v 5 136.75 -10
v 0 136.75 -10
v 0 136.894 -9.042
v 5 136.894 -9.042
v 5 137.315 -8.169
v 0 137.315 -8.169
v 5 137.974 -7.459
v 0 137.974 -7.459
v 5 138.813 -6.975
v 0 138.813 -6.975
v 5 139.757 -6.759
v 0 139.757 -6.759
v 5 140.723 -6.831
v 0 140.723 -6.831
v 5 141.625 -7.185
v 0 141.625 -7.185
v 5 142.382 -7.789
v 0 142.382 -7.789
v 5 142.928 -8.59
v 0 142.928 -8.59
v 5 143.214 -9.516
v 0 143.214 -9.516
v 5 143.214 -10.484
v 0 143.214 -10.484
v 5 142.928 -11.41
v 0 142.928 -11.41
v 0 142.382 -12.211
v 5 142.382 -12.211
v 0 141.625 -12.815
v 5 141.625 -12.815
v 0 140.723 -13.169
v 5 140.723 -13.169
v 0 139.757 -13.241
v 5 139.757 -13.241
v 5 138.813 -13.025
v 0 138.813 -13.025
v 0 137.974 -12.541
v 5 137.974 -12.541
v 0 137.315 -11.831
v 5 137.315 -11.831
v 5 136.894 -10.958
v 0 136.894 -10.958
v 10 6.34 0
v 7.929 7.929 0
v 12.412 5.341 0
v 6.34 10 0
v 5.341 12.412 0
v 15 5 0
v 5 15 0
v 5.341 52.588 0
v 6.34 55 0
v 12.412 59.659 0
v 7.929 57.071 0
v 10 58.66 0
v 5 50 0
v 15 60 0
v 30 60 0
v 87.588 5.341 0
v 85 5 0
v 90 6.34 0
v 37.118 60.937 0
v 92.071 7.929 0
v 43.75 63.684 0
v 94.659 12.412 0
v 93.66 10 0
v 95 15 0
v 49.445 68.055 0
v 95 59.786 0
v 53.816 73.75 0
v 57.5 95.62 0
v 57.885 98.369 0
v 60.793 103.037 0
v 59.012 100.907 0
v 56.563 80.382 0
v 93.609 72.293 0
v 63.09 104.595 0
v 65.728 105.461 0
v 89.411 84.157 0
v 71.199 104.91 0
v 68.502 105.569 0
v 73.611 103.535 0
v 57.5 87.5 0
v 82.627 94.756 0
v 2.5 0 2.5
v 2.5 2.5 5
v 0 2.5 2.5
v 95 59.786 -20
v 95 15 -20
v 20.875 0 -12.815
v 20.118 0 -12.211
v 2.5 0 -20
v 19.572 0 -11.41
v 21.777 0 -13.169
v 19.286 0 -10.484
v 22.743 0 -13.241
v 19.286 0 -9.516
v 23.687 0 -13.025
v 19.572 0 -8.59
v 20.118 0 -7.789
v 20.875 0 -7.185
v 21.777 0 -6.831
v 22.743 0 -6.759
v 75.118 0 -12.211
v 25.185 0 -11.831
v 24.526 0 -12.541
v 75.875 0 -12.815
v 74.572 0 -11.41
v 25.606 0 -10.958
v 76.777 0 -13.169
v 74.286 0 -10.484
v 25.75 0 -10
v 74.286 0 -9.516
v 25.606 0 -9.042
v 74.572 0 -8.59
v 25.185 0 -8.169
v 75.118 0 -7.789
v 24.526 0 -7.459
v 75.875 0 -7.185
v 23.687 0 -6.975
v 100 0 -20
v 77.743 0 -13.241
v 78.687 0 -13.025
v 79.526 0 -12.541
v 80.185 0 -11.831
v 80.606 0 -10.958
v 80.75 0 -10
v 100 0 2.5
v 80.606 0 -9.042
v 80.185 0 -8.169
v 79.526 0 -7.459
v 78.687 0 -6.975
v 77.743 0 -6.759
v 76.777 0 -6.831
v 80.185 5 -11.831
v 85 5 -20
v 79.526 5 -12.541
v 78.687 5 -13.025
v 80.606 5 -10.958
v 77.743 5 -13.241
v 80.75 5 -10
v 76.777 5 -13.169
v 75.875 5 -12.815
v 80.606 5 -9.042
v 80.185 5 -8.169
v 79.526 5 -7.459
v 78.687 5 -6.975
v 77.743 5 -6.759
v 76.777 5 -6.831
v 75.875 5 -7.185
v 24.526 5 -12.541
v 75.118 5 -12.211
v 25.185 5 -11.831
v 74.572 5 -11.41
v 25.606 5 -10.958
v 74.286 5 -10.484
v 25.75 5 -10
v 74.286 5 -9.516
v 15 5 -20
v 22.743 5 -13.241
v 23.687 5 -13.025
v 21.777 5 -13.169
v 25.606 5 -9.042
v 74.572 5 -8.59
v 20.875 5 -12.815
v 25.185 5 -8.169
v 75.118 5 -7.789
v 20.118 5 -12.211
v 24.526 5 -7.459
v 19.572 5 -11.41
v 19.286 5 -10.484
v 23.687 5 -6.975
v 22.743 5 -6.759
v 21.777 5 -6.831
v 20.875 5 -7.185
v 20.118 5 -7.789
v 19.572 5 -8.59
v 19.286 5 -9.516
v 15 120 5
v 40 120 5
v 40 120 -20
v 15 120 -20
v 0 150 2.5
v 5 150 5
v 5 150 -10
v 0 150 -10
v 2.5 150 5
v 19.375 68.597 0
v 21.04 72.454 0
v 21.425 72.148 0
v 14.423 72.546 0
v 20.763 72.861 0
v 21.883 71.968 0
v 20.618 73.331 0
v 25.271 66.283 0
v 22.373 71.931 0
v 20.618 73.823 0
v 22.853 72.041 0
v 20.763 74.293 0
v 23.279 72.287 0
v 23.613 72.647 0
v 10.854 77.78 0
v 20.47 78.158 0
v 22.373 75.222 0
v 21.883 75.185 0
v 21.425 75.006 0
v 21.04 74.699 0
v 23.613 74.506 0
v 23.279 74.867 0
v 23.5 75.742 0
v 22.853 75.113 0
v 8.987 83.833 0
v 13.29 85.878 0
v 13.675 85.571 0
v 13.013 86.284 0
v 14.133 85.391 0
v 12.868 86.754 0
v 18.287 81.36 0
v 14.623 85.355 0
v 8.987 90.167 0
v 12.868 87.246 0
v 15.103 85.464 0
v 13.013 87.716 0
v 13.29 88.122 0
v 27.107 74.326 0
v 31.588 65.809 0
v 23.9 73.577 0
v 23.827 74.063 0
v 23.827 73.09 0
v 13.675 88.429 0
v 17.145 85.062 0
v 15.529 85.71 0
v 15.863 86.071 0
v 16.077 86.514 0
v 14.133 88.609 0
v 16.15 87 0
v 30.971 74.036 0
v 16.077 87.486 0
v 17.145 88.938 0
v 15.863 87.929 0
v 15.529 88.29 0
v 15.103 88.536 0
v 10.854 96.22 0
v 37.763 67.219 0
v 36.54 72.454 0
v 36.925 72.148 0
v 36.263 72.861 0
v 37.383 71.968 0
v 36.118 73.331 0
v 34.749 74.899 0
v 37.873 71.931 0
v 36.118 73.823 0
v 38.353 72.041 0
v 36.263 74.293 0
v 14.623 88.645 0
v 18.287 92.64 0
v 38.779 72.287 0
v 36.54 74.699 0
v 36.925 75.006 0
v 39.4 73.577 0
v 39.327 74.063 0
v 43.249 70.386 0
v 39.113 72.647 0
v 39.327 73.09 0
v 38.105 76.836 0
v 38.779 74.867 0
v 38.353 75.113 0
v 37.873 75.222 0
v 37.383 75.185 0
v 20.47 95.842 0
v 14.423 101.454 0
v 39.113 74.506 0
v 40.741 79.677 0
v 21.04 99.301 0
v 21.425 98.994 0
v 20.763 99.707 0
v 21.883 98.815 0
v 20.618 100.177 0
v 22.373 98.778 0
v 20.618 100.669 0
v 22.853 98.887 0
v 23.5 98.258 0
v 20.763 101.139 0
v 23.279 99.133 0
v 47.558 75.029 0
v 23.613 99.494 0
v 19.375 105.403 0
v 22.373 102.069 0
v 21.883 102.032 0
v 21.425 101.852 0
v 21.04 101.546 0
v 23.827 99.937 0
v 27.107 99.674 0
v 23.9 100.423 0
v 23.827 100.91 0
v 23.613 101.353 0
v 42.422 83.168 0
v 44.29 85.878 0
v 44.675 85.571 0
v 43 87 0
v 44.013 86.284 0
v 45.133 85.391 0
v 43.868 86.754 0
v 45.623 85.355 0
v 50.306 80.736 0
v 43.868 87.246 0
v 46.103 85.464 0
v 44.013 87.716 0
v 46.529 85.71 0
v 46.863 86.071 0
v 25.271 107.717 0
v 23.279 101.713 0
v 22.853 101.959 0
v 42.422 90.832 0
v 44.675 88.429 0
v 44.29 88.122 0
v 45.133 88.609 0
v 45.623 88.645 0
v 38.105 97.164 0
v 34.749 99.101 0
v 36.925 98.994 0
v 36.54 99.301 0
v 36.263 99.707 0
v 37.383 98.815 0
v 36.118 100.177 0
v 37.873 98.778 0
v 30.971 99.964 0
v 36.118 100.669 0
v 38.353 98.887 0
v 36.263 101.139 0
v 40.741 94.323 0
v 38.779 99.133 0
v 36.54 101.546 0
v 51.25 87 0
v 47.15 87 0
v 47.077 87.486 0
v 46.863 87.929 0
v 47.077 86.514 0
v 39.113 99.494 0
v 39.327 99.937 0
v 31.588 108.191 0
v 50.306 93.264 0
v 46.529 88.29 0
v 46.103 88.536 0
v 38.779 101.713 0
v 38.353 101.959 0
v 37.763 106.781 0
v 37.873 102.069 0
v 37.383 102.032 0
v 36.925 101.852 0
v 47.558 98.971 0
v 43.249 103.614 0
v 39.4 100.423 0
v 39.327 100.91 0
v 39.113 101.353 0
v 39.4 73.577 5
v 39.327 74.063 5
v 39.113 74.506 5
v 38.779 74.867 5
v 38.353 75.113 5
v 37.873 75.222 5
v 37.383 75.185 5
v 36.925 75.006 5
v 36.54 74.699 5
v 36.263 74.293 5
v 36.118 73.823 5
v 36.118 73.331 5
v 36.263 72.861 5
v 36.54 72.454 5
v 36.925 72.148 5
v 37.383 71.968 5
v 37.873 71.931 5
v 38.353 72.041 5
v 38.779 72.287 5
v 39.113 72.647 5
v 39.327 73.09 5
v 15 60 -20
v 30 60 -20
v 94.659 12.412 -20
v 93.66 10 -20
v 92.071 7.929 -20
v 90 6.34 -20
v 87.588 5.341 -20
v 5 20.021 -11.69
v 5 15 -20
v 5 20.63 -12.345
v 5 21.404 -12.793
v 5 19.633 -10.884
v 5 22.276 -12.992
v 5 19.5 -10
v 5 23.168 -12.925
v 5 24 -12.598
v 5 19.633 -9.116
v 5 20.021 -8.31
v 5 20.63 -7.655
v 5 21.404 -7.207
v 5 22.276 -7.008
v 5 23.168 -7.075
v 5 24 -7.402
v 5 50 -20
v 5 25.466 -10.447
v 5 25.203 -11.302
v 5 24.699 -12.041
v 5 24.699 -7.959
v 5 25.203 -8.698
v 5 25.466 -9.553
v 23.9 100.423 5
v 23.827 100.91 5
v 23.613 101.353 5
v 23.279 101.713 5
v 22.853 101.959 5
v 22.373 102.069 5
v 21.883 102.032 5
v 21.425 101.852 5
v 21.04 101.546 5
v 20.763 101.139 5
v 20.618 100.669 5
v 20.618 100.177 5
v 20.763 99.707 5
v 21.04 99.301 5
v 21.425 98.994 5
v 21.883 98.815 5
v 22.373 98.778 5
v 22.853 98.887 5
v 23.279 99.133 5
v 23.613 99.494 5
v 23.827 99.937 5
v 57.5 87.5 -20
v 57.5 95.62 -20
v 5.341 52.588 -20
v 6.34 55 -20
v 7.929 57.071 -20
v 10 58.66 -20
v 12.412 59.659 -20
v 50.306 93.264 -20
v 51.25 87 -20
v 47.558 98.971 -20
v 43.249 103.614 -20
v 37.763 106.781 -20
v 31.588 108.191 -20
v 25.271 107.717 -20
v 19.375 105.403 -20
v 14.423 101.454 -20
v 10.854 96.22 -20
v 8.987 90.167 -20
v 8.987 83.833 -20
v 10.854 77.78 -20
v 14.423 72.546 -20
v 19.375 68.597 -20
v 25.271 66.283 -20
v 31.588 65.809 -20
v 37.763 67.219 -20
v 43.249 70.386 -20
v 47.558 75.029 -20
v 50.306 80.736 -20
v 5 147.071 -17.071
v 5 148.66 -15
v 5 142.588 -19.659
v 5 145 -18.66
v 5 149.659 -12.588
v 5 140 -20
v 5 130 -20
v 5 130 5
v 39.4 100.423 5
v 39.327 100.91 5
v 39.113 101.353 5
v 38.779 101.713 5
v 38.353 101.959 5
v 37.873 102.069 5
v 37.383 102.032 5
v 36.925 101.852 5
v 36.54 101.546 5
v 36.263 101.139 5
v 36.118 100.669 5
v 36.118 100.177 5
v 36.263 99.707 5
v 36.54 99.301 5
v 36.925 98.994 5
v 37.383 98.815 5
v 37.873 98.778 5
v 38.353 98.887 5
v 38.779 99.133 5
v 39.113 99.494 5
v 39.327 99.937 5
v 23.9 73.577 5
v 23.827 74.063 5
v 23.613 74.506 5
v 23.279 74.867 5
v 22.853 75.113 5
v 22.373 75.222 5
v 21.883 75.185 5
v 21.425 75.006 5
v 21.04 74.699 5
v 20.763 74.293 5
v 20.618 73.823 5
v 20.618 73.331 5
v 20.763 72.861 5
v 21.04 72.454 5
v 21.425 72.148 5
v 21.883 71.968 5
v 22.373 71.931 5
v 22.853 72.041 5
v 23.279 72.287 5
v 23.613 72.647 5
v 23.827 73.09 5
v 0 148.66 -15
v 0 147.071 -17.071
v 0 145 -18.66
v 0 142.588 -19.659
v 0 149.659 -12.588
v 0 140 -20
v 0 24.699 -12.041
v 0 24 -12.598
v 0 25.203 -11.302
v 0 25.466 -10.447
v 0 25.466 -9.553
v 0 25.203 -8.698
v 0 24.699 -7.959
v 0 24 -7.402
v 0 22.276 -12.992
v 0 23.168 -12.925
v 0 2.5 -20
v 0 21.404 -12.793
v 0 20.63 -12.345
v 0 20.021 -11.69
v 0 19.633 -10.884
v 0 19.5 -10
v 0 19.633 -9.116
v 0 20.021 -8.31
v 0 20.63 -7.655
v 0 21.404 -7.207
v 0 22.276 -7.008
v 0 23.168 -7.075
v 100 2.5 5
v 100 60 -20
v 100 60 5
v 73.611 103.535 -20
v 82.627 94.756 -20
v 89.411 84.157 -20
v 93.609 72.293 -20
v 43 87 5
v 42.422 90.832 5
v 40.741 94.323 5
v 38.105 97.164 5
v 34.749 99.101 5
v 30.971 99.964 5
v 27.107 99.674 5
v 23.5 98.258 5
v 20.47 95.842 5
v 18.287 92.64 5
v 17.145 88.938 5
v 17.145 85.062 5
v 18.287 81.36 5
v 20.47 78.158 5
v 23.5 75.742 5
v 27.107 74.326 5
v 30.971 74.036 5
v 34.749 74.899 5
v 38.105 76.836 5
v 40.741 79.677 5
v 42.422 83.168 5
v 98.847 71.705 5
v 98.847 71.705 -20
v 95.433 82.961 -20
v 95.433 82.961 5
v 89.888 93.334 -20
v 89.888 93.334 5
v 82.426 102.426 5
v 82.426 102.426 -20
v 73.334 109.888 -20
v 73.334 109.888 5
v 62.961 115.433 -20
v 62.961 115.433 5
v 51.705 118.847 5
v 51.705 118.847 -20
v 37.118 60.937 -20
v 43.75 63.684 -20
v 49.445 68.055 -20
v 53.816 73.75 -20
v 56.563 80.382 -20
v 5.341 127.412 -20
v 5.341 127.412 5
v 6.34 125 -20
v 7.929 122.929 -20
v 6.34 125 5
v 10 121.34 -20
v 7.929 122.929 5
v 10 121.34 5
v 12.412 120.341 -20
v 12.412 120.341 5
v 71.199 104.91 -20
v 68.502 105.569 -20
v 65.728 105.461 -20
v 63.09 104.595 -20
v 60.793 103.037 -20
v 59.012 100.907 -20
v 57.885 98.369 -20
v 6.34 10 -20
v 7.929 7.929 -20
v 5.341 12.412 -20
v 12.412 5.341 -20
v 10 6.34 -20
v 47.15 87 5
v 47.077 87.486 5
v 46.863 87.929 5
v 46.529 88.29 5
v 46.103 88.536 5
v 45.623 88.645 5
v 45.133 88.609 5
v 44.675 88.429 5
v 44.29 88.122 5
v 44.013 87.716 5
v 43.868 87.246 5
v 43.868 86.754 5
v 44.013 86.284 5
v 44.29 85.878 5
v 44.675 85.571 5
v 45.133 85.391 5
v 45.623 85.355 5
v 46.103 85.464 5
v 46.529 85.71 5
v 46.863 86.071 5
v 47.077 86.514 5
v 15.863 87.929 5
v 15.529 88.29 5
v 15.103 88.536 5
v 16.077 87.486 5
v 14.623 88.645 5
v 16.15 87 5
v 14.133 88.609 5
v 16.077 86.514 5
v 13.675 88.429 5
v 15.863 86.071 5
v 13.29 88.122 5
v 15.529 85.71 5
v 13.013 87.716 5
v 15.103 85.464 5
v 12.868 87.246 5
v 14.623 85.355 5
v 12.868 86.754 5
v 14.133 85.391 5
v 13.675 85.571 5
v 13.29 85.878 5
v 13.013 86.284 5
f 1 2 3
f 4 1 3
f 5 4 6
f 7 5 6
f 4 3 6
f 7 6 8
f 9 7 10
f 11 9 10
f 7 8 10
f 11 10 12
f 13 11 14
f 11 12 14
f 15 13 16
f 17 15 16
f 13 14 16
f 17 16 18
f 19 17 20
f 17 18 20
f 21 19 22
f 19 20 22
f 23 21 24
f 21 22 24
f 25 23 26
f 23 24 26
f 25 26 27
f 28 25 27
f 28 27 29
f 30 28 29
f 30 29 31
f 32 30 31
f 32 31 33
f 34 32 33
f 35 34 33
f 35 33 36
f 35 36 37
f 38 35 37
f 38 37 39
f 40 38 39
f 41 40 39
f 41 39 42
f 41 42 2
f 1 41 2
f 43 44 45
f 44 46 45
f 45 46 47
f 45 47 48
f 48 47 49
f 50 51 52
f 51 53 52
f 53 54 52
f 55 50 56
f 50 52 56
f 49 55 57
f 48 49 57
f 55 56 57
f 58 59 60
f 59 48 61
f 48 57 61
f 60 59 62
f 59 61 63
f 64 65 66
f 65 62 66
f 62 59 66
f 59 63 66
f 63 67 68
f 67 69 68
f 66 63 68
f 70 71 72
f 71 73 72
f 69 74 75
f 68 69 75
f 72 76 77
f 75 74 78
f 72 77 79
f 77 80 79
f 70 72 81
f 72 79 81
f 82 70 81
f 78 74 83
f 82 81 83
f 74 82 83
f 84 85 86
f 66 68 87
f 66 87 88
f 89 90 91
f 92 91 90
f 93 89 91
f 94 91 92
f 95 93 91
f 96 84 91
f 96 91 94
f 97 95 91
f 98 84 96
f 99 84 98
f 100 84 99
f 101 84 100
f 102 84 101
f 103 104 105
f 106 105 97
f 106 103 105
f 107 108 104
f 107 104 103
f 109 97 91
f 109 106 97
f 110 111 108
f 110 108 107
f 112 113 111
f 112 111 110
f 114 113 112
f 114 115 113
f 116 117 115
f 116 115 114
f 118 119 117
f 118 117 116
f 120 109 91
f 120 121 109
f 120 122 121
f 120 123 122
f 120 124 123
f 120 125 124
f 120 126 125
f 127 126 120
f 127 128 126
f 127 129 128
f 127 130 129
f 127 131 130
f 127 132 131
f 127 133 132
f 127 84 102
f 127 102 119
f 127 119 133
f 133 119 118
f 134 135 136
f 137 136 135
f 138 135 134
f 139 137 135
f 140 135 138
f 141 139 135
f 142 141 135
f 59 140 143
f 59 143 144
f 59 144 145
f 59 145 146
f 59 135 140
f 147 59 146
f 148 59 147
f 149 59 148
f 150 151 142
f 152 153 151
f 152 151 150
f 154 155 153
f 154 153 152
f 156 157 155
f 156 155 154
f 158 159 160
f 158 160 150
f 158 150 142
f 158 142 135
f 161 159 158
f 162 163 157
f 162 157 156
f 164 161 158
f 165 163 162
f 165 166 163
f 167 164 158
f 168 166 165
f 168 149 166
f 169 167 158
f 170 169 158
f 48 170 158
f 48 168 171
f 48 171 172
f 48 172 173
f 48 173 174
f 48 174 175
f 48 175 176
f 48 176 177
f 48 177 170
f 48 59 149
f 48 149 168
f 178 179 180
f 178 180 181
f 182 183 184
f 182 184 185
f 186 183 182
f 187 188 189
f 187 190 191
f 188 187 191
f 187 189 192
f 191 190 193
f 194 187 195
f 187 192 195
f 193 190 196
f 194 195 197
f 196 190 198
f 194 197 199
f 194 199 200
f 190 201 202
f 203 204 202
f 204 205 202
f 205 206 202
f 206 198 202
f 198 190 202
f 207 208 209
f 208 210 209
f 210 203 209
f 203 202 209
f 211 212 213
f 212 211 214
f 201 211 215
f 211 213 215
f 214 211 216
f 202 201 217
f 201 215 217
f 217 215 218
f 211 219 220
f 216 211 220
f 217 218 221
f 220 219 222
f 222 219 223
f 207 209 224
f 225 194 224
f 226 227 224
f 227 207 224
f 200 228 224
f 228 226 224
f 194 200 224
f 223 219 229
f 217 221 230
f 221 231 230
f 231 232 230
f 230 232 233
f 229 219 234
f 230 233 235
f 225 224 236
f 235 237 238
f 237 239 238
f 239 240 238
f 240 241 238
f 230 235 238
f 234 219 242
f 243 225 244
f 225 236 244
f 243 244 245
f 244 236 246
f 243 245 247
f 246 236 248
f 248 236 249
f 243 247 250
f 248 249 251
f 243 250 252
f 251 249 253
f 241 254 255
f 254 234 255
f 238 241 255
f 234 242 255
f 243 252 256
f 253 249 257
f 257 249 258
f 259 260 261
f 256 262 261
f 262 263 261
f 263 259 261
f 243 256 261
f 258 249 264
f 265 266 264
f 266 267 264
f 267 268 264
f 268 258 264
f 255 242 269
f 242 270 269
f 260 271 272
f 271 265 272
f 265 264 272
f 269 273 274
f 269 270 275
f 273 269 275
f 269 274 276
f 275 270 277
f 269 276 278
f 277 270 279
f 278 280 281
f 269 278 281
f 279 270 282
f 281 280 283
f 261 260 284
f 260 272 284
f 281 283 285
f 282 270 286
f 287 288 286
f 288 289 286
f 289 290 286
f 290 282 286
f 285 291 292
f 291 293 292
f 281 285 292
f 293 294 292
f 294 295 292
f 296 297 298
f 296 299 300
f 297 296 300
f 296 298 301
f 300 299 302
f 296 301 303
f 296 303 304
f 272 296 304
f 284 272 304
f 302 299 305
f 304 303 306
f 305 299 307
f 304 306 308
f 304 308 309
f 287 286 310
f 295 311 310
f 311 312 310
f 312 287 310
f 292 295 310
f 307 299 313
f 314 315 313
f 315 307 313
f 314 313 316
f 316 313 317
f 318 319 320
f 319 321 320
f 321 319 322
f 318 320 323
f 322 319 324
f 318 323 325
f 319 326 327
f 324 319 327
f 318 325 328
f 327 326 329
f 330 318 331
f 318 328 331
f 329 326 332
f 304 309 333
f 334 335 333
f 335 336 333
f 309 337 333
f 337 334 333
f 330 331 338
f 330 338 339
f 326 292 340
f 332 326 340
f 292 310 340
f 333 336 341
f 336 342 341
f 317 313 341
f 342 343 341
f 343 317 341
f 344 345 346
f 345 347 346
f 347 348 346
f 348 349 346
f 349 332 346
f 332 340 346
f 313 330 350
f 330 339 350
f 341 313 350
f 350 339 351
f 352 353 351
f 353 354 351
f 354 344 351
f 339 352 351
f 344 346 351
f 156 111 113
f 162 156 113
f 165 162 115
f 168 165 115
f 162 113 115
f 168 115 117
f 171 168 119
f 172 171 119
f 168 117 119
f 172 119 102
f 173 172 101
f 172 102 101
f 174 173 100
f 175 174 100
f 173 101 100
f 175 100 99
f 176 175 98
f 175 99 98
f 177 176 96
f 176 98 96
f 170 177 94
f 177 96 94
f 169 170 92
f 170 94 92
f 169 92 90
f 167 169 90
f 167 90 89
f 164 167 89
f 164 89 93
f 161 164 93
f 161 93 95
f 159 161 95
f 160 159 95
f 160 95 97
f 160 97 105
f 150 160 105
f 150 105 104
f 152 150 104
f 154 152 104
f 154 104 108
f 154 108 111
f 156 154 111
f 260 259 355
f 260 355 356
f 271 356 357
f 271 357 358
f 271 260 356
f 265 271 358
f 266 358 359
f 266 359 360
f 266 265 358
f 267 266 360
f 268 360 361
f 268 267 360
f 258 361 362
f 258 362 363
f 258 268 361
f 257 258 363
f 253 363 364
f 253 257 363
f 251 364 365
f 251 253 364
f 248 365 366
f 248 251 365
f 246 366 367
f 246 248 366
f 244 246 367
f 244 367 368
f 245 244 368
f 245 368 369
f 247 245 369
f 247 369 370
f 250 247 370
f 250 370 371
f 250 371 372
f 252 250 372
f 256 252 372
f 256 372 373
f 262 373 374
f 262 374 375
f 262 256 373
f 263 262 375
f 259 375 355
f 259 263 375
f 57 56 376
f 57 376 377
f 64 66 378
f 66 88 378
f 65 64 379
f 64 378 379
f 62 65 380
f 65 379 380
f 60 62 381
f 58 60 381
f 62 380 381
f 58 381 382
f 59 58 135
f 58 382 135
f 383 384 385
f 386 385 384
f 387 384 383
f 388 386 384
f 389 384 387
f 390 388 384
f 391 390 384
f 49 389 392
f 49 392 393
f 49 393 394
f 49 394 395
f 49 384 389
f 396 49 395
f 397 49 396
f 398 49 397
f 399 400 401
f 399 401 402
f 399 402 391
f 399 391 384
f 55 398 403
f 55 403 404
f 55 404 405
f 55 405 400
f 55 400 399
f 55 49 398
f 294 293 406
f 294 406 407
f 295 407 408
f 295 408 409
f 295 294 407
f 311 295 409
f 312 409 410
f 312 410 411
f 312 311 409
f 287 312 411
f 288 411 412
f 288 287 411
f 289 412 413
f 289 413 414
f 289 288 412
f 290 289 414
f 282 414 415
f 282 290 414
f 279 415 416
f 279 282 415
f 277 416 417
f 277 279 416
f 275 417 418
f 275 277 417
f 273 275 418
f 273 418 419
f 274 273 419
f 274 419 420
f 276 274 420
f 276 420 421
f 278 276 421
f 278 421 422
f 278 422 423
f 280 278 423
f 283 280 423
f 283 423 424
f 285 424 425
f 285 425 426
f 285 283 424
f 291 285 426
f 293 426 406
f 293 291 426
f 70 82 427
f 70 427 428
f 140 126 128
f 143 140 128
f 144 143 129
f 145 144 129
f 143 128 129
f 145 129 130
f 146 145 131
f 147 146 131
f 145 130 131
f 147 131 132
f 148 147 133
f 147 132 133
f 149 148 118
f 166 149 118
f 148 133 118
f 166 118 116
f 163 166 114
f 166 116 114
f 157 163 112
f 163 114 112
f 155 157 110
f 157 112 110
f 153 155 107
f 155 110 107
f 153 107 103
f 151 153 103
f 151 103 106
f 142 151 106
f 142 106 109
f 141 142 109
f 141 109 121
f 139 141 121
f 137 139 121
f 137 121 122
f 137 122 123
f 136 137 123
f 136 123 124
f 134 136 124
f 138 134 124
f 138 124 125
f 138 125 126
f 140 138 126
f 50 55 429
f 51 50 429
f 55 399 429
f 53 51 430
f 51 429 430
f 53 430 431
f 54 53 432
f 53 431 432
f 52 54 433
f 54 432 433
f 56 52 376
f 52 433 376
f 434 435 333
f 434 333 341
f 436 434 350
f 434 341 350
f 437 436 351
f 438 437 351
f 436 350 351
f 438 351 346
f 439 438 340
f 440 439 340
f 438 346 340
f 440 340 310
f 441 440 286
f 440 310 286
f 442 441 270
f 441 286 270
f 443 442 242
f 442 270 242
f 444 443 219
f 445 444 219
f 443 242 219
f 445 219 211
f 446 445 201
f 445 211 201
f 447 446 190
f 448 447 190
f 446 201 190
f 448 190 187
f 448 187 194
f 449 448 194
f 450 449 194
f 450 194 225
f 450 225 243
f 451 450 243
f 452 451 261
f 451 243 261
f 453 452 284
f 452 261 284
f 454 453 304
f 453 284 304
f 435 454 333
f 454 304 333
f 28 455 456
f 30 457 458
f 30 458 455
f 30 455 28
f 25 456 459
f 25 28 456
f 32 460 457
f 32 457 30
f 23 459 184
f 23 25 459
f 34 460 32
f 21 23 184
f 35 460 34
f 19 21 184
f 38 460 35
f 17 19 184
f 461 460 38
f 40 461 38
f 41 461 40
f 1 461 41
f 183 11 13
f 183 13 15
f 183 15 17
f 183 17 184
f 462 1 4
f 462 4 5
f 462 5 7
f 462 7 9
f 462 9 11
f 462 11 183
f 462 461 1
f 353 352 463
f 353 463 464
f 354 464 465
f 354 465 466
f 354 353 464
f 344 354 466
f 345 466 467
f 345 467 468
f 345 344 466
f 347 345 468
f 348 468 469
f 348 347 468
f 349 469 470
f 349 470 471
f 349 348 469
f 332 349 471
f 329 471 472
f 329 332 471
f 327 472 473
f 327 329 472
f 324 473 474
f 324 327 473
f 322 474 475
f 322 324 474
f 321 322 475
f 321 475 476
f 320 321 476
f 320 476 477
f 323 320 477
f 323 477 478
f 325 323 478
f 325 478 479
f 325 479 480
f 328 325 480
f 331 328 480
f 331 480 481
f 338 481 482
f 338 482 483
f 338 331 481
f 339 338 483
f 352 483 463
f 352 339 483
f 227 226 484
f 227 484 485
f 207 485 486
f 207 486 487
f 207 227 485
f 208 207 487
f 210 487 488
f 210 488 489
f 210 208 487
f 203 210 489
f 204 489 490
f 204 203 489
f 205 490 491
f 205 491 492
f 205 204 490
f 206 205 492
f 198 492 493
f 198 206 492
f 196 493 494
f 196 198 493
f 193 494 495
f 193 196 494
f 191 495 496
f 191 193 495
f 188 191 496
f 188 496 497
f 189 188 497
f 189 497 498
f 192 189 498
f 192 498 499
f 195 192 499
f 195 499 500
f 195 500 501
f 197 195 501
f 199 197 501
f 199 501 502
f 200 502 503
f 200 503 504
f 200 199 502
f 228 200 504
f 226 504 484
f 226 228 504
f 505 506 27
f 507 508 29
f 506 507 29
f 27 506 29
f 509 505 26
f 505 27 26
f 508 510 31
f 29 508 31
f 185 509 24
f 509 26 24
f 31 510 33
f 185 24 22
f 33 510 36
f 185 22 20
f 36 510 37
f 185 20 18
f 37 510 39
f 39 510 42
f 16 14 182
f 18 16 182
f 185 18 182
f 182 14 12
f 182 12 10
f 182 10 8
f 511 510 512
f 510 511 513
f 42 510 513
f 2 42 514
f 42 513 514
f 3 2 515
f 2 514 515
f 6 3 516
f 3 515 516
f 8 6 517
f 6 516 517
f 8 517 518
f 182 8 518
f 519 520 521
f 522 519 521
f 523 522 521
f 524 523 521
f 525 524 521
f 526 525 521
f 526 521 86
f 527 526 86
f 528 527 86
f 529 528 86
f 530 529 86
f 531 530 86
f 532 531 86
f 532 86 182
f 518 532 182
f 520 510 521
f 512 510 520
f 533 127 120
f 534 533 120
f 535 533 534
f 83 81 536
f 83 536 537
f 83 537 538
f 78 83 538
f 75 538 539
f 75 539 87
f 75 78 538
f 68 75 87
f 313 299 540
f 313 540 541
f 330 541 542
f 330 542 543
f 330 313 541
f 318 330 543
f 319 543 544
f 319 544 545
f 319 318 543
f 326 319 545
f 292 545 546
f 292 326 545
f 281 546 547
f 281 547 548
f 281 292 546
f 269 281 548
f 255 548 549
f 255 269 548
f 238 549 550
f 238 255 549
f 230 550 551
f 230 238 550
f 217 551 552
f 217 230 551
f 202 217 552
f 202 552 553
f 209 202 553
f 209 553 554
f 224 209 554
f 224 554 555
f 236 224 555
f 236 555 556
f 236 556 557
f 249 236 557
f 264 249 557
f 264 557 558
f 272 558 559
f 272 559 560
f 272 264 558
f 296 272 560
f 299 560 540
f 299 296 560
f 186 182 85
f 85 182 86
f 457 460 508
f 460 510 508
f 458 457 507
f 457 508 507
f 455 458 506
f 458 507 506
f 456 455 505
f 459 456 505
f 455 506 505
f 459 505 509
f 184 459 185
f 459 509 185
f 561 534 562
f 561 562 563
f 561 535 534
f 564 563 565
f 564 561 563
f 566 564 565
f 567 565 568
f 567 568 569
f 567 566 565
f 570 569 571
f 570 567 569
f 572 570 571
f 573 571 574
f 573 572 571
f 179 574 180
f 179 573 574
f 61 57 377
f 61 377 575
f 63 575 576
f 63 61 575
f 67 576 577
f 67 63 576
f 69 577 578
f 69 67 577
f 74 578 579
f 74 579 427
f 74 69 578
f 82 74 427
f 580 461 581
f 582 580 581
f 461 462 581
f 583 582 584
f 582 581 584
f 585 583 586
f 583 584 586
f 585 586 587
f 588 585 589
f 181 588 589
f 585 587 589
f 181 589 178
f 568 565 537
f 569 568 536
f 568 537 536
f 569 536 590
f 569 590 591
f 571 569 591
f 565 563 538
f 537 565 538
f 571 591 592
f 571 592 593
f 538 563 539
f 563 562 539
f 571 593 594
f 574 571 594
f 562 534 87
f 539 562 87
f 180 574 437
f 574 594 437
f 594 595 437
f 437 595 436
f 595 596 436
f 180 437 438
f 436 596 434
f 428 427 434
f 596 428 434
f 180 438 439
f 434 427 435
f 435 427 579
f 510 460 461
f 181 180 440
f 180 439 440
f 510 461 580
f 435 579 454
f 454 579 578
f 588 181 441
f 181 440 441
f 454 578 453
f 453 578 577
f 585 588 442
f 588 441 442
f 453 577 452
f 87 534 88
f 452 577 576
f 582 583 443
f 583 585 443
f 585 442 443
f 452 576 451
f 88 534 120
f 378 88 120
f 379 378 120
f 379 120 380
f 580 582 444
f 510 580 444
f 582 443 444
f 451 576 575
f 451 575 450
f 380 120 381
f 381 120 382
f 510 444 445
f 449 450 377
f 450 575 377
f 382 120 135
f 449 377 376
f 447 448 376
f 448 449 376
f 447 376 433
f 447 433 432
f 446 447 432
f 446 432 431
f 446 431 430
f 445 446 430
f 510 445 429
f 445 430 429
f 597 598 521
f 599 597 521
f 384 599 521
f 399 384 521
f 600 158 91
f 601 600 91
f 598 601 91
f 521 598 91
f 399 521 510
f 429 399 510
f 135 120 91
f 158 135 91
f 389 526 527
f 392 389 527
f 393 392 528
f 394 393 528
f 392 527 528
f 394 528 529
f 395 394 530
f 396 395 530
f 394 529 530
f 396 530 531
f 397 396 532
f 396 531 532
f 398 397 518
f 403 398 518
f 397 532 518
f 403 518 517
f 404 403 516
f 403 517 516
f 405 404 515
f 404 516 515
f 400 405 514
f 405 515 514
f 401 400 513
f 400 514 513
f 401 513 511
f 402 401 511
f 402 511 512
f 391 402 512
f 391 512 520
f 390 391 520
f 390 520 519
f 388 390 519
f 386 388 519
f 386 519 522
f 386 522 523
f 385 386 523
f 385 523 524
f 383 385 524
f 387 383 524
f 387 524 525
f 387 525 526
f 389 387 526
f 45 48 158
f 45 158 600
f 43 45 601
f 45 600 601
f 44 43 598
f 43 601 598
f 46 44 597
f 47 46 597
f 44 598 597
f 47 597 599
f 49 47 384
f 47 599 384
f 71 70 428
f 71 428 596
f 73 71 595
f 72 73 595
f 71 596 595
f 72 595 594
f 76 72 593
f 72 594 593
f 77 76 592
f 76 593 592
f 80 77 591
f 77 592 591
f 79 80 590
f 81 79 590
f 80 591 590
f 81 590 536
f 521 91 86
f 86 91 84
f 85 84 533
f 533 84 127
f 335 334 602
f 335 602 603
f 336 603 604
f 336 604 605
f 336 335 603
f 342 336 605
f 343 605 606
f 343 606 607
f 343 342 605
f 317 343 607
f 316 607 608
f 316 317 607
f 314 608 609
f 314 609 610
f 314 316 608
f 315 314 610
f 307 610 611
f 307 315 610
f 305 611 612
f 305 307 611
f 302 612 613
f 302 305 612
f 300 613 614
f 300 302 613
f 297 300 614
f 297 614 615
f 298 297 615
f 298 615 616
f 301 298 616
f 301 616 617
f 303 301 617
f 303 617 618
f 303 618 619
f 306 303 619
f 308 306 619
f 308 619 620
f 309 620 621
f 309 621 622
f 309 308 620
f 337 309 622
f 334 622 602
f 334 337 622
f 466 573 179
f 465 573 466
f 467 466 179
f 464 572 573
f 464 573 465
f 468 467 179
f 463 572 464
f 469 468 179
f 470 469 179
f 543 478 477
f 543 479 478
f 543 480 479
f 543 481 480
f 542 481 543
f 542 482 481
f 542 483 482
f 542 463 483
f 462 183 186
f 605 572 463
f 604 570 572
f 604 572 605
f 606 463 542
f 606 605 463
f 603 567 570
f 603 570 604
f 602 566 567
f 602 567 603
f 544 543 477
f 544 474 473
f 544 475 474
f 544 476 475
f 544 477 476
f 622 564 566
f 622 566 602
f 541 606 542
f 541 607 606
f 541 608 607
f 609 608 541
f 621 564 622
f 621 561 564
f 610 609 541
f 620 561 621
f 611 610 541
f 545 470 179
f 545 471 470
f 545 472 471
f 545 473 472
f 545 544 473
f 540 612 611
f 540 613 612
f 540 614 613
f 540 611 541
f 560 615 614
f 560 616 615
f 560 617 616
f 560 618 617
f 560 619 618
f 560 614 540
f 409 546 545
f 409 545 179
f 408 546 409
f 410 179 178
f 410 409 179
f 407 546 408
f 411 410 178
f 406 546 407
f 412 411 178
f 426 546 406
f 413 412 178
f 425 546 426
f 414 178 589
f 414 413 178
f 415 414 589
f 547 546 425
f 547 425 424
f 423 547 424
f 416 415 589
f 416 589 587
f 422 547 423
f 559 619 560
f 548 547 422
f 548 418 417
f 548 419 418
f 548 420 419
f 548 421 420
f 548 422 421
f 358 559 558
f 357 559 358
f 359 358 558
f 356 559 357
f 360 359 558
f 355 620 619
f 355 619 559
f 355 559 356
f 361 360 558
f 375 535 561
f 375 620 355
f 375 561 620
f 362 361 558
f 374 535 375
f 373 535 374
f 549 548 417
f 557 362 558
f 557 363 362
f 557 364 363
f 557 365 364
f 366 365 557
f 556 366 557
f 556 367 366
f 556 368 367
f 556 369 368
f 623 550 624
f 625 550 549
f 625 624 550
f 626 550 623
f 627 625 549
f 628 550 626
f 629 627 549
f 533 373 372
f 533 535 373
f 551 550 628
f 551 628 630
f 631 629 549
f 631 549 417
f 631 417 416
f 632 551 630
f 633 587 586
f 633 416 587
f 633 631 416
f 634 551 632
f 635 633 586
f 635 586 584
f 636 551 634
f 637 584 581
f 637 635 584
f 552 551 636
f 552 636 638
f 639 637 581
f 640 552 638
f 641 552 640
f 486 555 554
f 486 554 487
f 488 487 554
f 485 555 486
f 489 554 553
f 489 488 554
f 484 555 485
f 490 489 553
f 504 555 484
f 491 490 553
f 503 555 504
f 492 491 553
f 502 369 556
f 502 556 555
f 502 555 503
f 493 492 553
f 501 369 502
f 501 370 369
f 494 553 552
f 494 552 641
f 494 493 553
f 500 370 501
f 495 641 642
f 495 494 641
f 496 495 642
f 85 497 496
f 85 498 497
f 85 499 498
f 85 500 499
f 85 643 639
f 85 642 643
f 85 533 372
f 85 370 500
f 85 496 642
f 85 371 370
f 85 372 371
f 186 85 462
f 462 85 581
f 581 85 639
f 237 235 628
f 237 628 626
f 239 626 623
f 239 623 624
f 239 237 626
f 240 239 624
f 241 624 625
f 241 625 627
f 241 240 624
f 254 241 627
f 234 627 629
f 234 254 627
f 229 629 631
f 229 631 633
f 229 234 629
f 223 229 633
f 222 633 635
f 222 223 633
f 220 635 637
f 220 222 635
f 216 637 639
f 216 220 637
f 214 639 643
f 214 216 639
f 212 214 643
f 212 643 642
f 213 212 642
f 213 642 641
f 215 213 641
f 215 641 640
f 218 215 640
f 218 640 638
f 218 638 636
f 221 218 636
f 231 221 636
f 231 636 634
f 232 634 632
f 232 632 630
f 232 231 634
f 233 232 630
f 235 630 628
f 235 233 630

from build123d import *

# Parameters (mm, degrees)
F0_R     = 21.25
F0_R_2   = 1.65
F0_R_3   = 13
F1_DEPTH = 5
F2_DEPTH = 20
F3_W     = 5
F3_H     = 25
F4_DEPTH = 30
F6_R     = 3.25
F7_DEPTH = 25
F5_R     = 3
F5_R_2   = 3.25
F8_DEPTH = 25
F9_SIZE  = 2.5
F10_R    = 10


# Not quite as in the source:
# - a feature names something its author has since deleted; it is built from what else it names


with BuildPart() as f1:
    # F0 (on Top) → F1 (new body)
    with BuildSketch(Plane.XY):
        with BuildLine():
            Line((30, 60), (5, 60))
            Line((5, 60), (5, 5))
            Line((5, 5), (95, 5))
            Line((95, 5), (95, 59.7859807312))
            ThreePointArc((95, 59.7859807312), (84.7139923095, 92.0261844448), (57.5, 112.1416340365))
            Line((57.5, 112.1416340365), (57.5, 87.5))
            ThreePointArc((57.5, 87.5), (49.4454364826, 68.0545635174), (30, 60))
        make_face()
        with BuildLine():
            Line((40, 120), (5, 120))
            Line((5, 120), (5, 60))
            Line((5, 60), (30, 60))
            ThreePointArc((30, 60), (49.4454364826, 68.0545635174), (57.5, 87.5))
            Line((57.5, 87.5), (57.5, 112.1416340365))
            ThreePointArc((57.5, 112.1416340365), (84.7139923095, 92.0261844448), (95, 59.7859807312))
            Line((95, 59.7859807312), (95, 5))
            Line((95, 5), (100, 5))
            Line((100, 5), (100, 60))
            ThreePointArc((100, 60), (82.4264068712, 102.4264068712), (40, 120))
        make_face()
        with Locations((30, 87)):
            Circle(F0_R, mode=Mode.SUBTRACT)
        with Locations((30, 87)):
            Circle(F0_R)
        with Locations((22.25, 73.5766062413)):
            Circle(F0_R_2, mode=Mode.SUBTRACT)
        with Locations((14.5, 87)):
            Circle(F0_R_2, mode=Mode.SUBTRACT)
        with Locations((37.75, 73.5766062413)):
            Circle(F0_R_2, mode=Mode.SUBTRACT)
        with Locations((30, 87)):
            Circle(F0_R_3, mode=Mode.SUBTRACT)
        with Locations((45.5, 87)):
            Circle(F0_R_2, mode=Mode.SUBTRACT)
        with Locations((22.25, 100.4233937587)):
            Circle(F0_R_2, mode=Mode.SUBTRACT)
        with Locations((37.75, 100.4233937587)):
            Circle(F0_R_2, mode=Mode.SUBTRACT)
        Polygon((0, 120), (0, 0), (100, 0), (100, 5), (95, 5), (5, 5), (5, 60), (5, 120), align=None)
    extrude(amount=F1_DEPTH)

    # F0 (on Top) → F2 (join)
    with BuildSketch(Plane.XY):
        Polygon((0, 120), (0, 0), (100, 0), (100, 5), (95, 5), (5, 5), (5, 60), (5, 120), align=None)
        with BuildLine():
            Line((40, 120), (5, 120))
            Line((5, 120), (5, 60))
            Line((5, 60), (30, 60))
            ThreePointArc((30, 60), (49.4454364826, 68.0545635174), (57.5, 87.5))
            Line((57.5, 87.5), (57.5, 112.1416340365))
            ThreePointArc((57.5, 112.1416340365), (84.7139923095, 92.0261844448), (95, 59.7859807312))
            Line((95, 59.7859807312), (95, 5))
            Line((95, 5), (100, 5))
            Line((100, 5), (100, 60))
            ThreePointArc((100, 60), (82.4264068712, 102.4264068712), (40, 120))
        make_face()
        with Locations((30, 87)):
            Circle(F0_R, mode=Mode.SUBTRACT)
    extrude(amount=-F2_DEPTH)

    # F3 (on face) → F4 (join)
    with BuildSketch(Plane(origin=(0, 120, 0), x_dir=(-1, 0, 0), z_dir=(0, 1, 0))):
        with Locations((-2.5, -7.5)):
            Rectangle(F3_W, F3_H)
    extrude(amount=F4_DEPTH)

    # F6 (on face) → F7 (cut)
    with BuildSketch(Plane.XZ):
        with Locations((22.5, -10)):
            Circle(F6_R)
        with Locations((77.5, -10)):
            Circle(F6_R)
    extrude(amount=-F7_DEPTH, mode=Mode.SUBTRACT)

    # F5 (on face) → F8 (cut)
    with BuildSketch(Plane(origin=(0, 0, 0), x_dir=(0, -1, 0), z_dir=(-1, 0, 0))):
        with Locations((-22.5, -10)):
            Circle(F5_R)
        with Locations((-140, -10)):
            Circle(F5_R_2)
    extrude(amount=-F8_DEPTH, mode=Mode.SUBTRACT)

    # F9
    f9_edges = [f1.edges().sort_by_distance(p)[0] for p in [
        (50, 0, 5),
        (0, 75, 5),
        (0, 0, -7.5),
    ]]
    chamfer(f9_edges, length=F9_SIZE)

    # F10
    f10_edges = [f1.edges().sort_by_distance(p)[0] for p in [
        (5, 5, -10),
        (5, 60, -10),
        (57.5, 112.141634, -10),
        (95, 5, -10),
        (5, 120, -7.5),
        (2.5, 150, -20),
    ]]
    fillet(f10_edges, radius=F10_R)


solid = f1.part
